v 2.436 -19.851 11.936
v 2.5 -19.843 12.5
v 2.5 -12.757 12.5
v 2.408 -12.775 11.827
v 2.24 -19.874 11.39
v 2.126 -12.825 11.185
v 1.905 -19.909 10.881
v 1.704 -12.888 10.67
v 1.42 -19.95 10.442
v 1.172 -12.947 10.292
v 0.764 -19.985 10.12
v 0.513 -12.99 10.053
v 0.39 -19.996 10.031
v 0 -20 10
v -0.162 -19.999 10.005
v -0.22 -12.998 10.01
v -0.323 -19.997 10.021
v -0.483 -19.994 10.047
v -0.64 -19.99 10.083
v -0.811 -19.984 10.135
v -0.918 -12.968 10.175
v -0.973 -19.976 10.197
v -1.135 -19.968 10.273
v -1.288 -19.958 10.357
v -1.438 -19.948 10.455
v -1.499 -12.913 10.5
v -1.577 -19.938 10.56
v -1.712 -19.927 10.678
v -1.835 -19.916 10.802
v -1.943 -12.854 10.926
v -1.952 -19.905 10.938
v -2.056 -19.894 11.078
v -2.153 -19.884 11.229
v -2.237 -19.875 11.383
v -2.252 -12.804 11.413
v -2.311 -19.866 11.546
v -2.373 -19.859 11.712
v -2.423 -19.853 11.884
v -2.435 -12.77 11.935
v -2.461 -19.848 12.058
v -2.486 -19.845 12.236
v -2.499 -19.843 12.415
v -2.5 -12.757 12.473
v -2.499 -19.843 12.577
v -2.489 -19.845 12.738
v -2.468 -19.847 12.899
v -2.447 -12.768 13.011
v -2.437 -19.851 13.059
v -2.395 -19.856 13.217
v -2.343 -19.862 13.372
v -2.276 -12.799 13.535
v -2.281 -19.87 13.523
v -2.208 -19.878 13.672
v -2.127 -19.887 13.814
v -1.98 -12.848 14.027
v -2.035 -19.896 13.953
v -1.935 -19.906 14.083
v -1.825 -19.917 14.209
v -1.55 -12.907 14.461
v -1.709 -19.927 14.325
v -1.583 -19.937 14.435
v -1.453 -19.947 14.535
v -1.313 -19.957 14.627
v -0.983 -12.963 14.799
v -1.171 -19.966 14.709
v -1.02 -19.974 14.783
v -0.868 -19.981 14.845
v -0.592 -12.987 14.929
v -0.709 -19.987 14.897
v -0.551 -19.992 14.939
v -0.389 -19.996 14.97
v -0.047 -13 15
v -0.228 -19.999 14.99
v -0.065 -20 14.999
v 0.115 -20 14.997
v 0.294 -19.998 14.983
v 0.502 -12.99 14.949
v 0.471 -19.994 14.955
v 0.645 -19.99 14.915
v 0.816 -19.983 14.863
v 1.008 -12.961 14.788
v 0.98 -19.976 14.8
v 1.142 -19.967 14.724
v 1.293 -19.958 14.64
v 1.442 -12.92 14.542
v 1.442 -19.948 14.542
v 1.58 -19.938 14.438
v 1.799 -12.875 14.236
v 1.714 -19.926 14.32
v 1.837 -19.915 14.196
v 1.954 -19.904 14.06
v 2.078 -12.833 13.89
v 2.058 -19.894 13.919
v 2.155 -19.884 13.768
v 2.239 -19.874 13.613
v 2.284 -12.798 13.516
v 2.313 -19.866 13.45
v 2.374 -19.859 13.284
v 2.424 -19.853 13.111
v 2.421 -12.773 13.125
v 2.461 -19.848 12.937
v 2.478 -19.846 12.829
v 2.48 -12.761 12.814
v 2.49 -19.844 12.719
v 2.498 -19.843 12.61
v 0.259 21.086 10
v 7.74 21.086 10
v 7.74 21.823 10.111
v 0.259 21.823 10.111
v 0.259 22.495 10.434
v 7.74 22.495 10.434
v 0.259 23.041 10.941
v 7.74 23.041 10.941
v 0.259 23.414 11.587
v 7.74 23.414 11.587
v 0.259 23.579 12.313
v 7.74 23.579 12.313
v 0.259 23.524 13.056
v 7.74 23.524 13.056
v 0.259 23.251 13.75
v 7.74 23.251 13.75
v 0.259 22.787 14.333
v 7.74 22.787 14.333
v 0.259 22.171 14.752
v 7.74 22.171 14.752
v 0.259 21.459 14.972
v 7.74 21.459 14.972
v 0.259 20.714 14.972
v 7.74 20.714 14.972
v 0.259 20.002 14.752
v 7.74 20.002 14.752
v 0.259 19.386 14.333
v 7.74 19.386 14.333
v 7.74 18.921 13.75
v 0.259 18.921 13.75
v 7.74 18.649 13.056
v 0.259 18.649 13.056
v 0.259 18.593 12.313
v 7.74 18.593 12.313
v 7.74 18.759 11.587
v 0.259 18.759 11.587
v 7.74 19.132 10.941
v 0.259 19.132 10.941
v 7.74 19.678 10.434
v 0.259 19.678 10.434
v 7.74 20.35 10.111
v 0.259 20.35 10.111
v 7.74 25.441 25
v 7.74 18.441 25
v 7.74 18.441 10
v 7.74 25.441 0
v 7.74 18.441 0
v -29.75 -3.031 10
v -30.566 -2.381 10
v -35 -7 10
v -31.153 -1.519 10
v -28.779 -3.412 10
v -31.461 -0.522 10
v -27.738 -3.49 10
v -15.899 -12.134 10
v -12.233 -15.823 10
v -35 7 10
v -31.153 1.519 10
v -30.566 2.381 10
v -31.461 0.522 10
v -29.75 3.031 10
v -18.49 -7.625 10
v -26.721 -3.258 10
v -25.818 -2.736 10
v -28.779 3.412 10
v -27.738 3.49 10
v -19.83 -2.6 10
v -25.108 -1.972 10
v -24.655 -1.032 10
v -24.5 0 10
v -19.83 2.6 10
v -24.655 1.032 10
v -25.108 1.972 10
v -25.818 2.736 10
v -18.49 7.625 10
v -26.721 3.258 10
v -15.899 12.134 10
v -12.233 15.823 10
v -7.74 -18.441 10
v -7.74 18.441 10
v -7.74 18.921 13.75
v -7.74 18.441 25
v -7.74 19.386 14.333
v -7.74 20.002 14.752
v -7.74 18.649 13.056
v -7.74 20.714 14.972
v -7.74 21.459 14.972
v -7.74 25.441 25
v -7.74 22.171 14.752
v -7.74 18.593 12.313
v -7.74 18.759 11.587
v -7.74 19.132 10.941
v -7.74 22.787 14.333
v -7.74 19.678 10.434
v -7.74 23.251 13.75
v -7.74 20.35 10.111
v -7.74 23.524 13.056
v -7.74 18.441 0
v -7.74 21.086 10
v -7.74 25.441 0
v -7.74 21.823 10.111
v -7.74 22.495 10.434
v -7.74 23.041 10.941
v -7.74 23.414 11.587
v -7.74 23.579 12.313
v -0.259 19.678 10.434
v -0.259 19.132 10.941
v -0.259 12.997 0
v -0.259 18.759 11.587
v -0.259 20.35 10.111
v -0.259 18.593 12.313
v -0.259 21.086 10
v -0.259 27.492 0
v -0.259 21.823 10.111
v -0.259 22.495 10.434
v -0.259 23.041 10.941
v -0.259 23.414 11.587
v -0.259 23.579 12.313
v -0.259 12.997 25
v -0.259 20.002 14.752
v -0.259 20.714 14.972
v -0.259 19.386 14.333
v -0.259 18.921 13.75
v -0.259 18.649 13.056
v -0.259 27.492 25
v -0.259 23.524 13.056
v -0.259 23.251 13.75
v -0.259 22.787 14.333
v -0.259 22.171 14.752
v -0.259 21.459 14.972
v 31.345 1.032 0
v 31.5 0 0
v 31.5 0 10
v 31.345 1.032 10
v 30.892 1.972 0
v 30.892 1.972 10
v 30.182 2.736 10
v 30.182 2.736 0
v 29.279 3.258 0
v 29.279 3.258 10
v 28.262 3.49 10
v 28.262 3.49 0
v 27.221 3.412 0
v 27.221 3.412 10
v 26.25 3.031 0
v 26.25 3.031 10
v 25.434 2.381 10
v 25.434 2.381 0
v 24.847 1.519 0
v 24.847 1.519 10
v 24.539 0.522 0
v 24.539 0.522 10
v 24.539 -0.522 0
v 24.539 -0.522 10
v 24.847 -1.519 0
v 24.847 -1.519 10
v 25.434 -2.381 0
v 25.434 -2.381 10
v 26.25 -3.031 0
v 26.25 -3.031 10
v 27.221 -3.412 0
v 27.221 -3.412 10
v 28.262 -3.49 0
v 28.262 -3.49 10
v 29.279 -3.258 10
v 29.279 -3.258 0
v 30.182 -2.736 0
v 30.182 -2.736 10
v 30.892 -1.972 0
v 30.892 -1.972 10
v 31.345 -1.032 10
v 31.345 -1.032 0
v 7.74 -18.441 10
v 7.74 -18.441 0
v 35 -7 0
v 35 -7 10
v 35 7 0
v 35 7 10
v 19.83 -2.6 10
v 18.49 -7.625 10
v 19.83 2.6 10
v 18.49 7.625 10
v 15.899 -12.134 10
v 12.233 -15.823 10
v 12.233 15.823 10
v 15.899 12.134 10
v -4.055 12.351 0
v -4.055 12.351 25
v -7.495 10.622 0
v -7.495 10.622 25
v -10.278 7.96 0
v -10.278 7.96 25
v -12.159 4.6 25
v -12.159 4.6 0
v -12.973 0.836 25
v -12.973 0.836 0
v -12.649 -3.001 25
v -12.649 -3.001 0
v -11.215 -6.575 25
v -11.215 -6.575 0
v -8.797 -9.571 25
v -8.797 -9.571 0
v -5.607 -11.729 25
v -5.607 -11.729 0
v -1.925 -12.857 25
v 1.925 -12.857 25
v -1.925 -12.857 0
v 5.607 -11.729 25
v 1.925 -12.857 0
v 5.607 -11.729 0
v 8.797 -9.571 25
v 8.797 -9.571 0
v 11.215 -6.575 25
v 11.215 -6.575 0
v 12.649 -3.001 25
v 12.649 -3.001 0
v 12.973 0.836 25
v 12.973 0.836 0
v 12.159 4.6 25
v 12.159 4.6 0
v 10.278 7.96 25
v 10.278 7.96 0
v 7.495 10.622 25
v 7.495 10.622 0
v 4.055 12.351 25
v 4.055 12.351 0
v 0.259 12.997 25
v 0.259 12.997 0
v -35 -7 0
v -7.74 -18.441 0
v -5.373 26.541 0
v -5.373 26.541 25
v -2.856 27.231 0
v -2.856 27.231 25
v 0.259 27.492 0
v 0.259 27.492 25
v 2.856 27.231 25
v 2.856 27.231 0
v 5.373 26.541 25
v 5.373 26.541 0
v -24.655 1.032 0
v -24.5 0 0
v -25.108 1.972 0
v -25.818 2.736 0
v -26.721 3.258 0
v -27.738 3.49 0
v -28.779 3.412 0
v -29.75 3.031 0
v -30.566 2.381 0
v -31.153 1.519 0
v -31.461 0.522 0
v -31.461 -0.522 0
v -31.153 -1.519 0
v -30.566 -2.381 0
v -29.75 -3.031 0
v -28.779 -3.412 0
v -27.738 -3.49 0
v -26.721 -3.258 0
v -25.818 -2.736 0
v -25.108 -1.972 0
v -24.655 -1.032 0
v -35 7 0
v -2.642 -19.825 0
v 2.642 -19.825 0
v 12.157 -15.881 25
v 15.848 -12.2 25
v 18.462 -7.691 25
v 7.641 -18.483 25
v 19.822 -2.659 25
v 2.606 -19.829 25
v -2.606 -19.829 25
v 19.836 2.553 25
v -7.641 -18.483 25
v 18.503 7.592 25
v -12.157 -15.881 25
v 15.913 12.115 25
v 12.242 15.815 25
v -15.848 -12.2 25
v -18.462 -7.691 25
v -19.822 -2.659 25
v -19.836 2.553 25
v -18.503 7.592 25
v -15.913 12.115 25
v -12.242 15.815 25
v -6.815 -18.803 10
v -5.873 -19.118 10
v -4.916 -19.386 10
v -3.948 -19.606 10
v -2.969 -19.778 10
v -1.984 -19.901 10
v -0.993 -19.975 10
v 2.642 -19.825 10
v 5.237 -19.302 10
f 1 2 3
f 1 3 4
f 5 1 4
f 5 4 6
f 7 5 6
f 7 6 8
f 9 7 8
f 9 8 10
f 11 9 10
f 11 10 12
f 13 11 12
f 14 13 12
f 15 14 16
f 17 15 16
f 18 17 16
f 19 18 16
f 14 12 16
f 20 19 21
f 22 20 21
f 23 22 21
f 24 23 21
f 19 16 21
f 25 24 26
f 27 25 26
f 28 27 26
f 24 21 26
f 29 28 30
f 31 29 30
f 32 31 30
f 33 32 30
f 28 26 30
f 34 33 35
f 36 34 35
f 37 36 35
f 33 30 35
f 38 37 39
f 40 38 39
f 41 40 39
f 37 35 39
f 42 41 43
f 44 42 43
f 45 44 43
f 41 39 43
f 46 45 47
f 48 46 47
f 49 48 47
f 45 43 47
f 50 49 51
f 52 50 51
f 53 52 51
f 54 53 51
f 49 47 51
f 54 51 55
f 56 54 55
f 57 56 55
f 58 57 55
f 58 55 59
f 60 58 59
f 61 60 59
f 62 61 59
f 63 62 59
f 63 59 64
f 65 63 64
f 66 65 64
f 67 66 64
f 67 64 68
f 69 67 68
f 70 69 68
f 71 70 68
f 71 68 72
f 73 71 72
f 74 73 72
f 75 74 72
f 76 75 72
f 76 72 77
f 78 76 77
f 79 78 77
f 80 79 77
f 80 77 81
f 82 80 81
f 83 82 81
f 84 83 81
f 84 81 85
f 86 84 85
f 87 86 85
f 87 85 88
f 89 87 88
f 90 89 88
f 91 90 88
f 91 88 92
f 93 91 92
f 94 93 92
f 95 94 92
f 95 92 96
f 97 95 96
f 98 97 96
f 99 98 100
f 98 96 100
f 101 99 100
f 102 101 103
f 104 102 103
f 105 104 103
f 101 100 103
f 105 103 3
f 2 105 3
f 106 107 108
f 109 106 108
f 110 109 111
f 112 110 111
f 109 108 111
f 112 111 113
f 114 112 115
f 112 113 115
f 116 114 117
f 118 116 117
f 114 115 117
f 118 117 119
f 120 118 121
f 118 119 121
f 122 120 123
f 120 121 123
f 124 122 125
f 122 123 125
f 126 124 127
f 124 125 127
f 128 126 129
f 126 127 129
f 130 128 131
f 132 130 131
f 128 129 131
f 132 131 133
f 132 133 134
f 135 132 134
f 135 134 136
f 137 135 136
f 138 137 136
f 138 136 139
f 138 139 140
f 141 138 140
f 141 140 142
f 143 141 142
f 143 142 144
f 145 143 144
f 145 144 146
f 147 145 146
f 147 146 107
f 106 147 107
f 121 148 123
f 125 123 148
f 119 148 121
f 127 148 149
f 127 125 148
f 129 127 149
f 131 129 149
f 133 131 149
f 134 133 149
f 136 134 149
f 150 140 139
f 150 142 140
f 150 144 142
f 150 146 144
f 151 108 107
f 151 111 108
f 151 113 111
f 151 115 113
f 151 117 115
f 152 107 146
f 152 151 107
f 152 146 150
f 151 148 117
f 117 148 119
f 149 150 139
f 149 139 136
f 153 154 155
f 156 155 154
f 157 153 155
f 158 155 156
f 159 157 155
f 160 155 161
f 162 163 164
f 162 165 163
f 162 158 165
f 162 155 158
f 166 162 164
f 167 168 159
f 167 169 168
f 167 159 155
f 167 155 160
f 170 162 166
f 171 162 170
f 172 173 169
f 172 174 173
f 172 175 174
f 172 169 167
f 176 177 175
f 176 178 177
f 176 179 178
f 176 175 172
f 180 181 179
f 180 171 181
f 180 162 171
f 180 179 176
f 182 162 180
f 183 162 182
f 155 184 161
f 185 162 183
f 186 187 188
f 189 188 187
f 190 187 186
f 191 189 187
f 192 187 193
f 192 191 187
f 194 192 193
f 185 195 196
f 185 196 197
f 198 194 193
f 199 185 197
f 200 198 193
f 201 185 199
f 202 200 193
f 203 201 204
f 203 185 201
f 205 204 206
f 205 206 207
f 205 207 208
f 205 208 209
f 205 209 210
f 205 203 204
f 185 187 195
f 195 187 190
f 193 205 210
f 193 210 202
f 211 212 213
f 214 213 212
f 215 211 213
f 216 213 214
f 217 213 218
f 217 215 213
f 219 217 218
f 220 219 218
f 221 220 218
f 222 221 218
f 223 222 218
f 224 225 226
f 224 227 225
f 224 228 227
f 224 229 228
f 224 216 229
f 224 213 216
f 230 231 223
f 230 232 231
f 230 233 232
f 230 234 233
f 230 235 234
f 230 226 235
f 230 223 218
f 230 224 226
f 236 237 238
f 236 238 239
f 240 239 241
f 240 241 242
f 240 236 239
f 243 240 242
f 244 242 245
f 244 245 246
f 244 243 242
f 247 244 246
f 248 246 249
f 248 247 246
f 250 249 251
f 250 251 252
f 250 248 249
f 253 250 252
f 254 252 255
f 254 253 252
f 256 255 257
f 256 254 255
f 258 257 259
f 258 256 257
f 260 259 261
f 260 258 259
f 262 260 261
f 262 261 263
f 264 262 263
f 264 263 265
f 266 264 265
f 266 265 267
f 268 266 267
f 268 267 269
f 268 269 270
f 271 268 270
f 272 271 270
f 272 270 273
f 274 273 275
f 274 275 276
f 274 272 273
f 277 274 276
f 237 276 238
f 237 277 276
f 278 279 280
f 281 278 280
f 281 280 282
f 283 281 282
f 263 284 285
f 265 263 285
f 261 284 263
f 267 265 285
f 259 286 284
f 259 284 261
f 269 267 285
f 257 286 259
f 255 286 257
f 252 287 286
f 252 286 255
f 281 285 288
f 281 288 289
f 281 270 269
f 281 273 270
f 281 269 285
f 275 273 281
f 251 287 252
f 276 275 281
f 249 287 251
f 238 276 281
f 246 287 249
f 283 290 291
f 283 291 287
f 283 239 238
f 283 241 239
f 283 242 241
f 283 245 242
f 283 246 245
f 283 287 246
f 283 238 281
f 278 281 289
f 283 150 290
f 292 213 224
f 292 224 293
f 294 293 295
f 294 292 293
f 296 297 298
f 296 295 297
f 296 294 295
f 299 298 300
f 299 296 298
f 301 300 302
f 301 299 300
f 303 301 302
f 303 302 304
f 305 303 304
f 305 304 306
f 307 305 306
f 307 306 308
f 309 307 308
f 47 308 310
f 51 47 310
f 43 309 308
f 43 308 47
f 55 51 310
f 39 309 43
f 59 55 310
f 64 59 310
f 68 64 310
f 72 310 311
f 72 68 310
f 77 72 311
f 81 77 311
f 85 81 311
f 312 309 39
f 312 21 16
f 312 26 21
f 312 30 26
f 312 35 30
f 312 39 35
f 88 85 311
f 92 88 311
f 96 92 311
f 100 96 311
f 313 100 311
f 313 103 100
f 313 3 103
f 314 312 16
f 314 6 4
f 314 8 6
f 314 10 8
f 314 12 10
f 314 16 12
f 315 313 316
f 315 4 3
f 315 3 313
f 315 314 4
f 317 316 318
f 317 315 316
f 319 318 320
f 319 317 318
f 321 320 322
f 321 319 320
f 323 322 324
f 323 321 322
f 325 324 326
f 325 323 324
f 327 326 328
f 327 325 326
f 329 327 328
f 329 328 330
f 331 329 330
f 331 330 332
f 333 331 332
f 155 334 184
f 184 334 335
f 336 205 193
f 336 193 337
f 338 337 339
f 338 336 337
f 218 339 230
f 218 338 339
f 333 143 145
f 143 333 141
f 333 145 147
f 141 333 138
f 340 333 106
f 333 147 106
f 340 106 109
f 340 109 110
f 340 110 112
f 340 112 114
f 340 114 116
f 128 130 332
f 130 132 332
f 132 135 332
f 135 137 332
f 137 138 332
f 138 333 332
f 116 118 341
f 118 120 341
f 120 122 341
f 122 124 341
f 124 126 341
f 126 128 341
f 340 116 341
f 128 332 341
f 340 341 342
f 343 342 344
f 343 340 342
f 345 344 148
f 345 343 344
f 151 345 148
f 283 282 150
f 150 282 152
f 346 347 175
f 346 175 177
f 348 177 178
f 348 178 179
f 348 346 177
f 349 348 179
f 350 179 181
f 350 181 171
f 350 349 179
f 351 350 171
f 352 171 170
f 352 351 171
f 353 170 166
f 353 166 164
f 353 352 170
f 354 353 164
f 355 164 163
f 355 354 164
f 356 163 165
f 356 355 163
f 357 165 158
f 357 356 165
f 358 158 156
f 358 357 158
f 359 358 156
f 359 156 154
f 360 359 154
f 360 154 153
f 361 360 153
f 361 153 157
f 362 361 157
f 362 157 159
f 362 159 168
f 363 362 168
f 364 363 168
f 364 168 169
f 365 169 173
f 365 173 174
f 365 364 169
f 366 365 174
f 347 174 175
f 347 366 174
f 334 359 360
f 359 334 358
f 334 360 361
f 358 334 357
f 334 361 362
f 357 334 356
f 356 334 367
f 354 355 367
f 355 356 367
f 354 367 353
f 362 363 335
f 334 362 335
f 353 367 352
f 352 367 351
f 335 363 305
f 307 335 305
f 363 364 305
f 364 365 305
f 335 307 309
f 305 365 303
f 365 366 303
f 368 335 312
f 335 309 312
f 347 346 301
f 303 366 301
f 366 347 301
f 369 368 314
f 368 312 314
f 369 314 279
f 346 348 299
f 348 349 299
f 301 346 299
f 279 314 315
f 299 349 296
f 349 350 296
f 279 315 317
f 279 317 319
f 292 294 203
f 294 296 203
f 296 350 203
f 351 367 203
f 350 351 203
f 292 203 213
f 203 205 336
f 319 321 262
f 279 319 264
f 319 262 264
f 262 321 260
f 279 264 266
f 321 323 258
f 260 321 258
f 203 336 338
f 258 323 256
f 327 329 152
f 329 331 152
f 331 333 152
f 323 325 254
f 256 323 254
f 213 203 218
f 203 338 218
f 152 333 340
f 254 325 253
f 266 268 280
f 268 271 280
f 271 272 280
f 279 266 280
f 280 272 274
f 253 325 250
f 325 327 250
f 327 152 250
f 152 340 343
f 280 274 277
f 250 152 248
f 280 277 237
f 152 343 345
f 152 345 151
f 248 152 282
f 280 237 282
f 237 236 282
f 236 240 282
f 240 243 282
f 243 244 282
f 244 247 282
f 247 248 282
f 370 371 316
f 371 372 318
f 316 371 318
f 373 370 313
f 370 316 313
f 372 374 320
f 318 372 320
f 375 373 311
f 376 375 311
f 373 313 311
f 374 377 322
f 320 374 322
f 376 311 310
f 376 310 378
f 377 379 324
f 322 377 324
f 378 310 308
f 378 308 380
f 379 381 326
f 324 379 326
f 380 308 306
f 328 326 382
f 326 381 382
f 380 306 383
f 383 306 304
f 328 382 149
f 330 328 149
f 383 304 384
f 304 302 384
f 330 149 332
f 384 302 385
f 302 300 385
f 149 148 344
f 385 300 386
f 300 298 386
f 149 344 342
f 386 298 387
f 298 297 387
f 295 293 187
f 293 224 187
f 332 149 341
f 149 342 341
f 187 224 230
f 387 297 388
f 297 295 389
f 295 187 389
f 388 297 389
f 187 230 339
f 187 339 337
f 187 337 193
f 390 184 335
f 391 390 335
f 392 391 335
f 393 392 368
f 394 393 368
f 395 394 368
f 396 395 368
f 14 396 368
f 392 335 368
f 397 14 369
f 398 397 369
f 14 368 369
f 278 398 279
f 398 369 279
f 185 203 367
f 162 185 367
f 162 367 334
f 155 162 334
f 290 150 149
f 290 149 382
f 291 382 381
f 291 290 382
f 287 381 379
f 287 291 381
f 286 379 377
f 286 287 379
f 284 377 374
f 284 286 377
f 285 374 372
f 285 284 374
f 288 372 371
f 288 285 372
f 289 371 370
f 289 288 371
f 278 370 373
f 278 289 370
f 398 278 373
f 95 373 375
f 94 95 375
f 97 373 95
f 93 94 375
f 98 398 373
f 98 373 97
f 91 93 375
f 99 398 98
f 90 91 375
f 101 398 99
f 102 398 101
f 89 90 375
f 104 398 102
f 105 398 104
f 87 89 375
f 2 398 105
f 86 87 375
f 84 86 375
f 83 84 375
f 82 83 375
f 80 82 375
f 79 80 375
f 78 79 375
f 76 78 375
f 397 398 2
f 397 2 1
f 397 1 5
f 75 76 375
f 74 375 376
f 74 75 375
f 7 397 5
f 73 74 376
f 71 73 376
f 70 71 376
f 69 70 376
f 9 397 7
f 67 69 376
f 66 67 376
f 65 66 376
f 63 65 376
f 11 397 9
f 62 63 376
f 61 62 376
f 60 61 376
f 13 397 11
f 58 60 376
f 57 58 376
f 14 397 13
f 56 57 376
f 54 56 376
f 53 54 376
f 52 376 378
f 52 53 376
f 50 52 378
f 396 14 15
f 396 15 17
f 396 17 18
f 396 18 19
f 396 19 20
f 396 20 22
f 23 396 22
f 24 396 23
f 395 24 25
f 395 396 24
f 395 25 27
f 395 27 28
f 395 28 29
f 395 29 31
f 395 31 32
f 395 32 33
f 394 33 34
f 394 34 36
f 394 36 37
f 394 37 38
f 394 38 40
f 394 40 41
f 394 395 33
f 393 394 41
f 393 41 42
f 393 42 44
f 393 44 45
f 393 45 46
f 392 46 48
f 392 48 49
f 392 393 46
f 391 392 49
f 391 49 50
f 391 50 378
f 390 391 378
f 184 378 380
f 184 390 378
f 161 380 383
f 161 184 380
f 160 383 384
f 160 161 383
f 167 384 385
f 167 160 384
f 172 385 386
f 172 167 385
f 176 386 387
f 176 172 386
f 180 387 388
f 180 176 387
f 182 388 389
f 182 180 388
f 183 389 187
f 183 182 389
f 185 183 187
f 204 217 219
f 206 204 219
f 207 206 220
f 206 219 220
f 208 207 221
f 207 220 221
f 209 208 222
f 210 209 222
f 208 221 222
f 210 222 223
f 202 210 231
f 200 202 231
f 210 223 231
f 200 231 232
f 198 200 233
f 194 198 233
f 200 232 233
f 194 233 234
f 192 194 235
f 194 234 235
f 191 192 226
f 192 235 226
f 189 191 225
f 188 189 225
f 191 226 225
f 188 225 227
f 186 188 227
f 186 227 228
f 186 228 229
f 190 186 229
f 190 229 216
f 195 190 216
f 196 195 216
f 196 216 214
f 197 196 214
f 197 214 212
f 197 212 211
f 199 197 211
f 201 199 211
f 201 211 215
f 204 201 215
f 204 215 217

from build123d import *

# Parameters (mm, degrees)
SKETCH_1_R          = 3.5
SKETCH_1_R_2        = 13
EXTRUDE_2_DEPTH     = 10
SKETCH_2_R          = 13
EXTRUDE_3_DEPTH     = 15
SKETCH_3_W          = 0.517195108
SKETCH_3_H          = 18.726193104
CUT_EXTRUDE_1_DEPTH = 26
SKETCH_4_R          = 2.5
CUT_EXTRUDE_2_DEPTH = 43.740275714
SKETCH_5_R          = 2.5
CUT_EXTRUDE_3_DEPTH = 21


with BuildPart() as part:
    # 草图1 → 凸台-拉伸2 (new body)
    with BuildSketch(Plane.XY):
        with BuildLine():
            Line((-35, -7), (-7.740275714, -18.44147857))
            ThreePointArc((-7.740275714, -18.44147857), (0, -20), (7.740275714, -18.44147857))
            Line((7.740275714, -18.44147857), (35, -7))
            Line((35, -7), (35, 7))
            Line((35, 7), (7.740275714, 18.44147857))
            Line((7.740275714, 18.44147857), (7.740275714, 25.44147857))
            ThreePointArc((7.740275714, 25.44147857), (0, 27.494244152), (-7.740275714, 25.44147857))
            Line((-7.740275714, 25.44147857), (-7.740275714, 18.44147857))
            Line((-7.740275714, 18.44147857), (-35, 7))
            Line((-35, 7), (-35, -7))
        make_face()
        with Locations((-28, 0)):
            Circle(SKETCH_1_R, mode=Mode.SUBTRACT)
        Circle(SKETCH_1_R_2, mode=Mode.SUBTRACT)
        with Locations((28, 0)):
            Circle(SKETCH_1_R, mode=Mode.SUBTRACT)
    extrude(amount=EXTRUDE_2_DEPTH)

    # 草图2 → 凸台-拉伸3 (add)
    with BuildSketch(Plane.XY.offset(10)):
        with BuildLine():
            Line((-7.740275714, 18.44147857), (-7.740275714, 25.44147857))
            ThreePointArc((-7.740275714, 25.44147857), (0, 27.494244152), (7.740275714, 25.44147857))
            Line((7.740275714, 25.44147857), (7.740275714, 18.44147857))
            ThreePointArc((7.740275714, 18.44147857), (0, -20), (-7.740275714, 18.44147857))
        make_face()
        Circle(SKETCH_2_R, mode=Mode.SUBTRACT)
    extrude(amount=EXTRUDE_3_DEPTH)

    # 草图3 → 切除-拉伸1 (cut, through all)
    with BuildSketch(Plane.XY.offset(25)):
        with Locations((0, 21.741202931)):
            Rectangle(SKETCH_3_W, SKETCH_3_H)
    extrude(amount=-CUT_EXTRUDE_1_DEPTH, mode=Mode.SUBTRACT)

    # 草图4 → 切除-拉伸2 (cut, through all)
    with BuildSketch(Plane(origin=(7.740275714, 0, 0), x_dir=(0, 0, -1), z_dir=(1, 0, 0))):
        with Locations((-12.5, 21.086423576)):
            Circle(SKETCH_4_R)
    extrude(amount=-CUT_EXTRUDE_2_DEPTH, mode=Mode.SUBTRACT)

    # 草图5 → 切除-拉伸3 (cut, through all)
    with BuildSketch(Plane(origin=(0, 0, 0), x_dir=(1, 0, 0), z_dir=(0, 1, 0))):
        with Locations((0, -12.5)):
            Circle(SKETCH_5_R)
    extrude(amount=-CUT_EXTRUDE_3_DEPTH, mode=Mode.SUBTRACT)


solid = part.part
